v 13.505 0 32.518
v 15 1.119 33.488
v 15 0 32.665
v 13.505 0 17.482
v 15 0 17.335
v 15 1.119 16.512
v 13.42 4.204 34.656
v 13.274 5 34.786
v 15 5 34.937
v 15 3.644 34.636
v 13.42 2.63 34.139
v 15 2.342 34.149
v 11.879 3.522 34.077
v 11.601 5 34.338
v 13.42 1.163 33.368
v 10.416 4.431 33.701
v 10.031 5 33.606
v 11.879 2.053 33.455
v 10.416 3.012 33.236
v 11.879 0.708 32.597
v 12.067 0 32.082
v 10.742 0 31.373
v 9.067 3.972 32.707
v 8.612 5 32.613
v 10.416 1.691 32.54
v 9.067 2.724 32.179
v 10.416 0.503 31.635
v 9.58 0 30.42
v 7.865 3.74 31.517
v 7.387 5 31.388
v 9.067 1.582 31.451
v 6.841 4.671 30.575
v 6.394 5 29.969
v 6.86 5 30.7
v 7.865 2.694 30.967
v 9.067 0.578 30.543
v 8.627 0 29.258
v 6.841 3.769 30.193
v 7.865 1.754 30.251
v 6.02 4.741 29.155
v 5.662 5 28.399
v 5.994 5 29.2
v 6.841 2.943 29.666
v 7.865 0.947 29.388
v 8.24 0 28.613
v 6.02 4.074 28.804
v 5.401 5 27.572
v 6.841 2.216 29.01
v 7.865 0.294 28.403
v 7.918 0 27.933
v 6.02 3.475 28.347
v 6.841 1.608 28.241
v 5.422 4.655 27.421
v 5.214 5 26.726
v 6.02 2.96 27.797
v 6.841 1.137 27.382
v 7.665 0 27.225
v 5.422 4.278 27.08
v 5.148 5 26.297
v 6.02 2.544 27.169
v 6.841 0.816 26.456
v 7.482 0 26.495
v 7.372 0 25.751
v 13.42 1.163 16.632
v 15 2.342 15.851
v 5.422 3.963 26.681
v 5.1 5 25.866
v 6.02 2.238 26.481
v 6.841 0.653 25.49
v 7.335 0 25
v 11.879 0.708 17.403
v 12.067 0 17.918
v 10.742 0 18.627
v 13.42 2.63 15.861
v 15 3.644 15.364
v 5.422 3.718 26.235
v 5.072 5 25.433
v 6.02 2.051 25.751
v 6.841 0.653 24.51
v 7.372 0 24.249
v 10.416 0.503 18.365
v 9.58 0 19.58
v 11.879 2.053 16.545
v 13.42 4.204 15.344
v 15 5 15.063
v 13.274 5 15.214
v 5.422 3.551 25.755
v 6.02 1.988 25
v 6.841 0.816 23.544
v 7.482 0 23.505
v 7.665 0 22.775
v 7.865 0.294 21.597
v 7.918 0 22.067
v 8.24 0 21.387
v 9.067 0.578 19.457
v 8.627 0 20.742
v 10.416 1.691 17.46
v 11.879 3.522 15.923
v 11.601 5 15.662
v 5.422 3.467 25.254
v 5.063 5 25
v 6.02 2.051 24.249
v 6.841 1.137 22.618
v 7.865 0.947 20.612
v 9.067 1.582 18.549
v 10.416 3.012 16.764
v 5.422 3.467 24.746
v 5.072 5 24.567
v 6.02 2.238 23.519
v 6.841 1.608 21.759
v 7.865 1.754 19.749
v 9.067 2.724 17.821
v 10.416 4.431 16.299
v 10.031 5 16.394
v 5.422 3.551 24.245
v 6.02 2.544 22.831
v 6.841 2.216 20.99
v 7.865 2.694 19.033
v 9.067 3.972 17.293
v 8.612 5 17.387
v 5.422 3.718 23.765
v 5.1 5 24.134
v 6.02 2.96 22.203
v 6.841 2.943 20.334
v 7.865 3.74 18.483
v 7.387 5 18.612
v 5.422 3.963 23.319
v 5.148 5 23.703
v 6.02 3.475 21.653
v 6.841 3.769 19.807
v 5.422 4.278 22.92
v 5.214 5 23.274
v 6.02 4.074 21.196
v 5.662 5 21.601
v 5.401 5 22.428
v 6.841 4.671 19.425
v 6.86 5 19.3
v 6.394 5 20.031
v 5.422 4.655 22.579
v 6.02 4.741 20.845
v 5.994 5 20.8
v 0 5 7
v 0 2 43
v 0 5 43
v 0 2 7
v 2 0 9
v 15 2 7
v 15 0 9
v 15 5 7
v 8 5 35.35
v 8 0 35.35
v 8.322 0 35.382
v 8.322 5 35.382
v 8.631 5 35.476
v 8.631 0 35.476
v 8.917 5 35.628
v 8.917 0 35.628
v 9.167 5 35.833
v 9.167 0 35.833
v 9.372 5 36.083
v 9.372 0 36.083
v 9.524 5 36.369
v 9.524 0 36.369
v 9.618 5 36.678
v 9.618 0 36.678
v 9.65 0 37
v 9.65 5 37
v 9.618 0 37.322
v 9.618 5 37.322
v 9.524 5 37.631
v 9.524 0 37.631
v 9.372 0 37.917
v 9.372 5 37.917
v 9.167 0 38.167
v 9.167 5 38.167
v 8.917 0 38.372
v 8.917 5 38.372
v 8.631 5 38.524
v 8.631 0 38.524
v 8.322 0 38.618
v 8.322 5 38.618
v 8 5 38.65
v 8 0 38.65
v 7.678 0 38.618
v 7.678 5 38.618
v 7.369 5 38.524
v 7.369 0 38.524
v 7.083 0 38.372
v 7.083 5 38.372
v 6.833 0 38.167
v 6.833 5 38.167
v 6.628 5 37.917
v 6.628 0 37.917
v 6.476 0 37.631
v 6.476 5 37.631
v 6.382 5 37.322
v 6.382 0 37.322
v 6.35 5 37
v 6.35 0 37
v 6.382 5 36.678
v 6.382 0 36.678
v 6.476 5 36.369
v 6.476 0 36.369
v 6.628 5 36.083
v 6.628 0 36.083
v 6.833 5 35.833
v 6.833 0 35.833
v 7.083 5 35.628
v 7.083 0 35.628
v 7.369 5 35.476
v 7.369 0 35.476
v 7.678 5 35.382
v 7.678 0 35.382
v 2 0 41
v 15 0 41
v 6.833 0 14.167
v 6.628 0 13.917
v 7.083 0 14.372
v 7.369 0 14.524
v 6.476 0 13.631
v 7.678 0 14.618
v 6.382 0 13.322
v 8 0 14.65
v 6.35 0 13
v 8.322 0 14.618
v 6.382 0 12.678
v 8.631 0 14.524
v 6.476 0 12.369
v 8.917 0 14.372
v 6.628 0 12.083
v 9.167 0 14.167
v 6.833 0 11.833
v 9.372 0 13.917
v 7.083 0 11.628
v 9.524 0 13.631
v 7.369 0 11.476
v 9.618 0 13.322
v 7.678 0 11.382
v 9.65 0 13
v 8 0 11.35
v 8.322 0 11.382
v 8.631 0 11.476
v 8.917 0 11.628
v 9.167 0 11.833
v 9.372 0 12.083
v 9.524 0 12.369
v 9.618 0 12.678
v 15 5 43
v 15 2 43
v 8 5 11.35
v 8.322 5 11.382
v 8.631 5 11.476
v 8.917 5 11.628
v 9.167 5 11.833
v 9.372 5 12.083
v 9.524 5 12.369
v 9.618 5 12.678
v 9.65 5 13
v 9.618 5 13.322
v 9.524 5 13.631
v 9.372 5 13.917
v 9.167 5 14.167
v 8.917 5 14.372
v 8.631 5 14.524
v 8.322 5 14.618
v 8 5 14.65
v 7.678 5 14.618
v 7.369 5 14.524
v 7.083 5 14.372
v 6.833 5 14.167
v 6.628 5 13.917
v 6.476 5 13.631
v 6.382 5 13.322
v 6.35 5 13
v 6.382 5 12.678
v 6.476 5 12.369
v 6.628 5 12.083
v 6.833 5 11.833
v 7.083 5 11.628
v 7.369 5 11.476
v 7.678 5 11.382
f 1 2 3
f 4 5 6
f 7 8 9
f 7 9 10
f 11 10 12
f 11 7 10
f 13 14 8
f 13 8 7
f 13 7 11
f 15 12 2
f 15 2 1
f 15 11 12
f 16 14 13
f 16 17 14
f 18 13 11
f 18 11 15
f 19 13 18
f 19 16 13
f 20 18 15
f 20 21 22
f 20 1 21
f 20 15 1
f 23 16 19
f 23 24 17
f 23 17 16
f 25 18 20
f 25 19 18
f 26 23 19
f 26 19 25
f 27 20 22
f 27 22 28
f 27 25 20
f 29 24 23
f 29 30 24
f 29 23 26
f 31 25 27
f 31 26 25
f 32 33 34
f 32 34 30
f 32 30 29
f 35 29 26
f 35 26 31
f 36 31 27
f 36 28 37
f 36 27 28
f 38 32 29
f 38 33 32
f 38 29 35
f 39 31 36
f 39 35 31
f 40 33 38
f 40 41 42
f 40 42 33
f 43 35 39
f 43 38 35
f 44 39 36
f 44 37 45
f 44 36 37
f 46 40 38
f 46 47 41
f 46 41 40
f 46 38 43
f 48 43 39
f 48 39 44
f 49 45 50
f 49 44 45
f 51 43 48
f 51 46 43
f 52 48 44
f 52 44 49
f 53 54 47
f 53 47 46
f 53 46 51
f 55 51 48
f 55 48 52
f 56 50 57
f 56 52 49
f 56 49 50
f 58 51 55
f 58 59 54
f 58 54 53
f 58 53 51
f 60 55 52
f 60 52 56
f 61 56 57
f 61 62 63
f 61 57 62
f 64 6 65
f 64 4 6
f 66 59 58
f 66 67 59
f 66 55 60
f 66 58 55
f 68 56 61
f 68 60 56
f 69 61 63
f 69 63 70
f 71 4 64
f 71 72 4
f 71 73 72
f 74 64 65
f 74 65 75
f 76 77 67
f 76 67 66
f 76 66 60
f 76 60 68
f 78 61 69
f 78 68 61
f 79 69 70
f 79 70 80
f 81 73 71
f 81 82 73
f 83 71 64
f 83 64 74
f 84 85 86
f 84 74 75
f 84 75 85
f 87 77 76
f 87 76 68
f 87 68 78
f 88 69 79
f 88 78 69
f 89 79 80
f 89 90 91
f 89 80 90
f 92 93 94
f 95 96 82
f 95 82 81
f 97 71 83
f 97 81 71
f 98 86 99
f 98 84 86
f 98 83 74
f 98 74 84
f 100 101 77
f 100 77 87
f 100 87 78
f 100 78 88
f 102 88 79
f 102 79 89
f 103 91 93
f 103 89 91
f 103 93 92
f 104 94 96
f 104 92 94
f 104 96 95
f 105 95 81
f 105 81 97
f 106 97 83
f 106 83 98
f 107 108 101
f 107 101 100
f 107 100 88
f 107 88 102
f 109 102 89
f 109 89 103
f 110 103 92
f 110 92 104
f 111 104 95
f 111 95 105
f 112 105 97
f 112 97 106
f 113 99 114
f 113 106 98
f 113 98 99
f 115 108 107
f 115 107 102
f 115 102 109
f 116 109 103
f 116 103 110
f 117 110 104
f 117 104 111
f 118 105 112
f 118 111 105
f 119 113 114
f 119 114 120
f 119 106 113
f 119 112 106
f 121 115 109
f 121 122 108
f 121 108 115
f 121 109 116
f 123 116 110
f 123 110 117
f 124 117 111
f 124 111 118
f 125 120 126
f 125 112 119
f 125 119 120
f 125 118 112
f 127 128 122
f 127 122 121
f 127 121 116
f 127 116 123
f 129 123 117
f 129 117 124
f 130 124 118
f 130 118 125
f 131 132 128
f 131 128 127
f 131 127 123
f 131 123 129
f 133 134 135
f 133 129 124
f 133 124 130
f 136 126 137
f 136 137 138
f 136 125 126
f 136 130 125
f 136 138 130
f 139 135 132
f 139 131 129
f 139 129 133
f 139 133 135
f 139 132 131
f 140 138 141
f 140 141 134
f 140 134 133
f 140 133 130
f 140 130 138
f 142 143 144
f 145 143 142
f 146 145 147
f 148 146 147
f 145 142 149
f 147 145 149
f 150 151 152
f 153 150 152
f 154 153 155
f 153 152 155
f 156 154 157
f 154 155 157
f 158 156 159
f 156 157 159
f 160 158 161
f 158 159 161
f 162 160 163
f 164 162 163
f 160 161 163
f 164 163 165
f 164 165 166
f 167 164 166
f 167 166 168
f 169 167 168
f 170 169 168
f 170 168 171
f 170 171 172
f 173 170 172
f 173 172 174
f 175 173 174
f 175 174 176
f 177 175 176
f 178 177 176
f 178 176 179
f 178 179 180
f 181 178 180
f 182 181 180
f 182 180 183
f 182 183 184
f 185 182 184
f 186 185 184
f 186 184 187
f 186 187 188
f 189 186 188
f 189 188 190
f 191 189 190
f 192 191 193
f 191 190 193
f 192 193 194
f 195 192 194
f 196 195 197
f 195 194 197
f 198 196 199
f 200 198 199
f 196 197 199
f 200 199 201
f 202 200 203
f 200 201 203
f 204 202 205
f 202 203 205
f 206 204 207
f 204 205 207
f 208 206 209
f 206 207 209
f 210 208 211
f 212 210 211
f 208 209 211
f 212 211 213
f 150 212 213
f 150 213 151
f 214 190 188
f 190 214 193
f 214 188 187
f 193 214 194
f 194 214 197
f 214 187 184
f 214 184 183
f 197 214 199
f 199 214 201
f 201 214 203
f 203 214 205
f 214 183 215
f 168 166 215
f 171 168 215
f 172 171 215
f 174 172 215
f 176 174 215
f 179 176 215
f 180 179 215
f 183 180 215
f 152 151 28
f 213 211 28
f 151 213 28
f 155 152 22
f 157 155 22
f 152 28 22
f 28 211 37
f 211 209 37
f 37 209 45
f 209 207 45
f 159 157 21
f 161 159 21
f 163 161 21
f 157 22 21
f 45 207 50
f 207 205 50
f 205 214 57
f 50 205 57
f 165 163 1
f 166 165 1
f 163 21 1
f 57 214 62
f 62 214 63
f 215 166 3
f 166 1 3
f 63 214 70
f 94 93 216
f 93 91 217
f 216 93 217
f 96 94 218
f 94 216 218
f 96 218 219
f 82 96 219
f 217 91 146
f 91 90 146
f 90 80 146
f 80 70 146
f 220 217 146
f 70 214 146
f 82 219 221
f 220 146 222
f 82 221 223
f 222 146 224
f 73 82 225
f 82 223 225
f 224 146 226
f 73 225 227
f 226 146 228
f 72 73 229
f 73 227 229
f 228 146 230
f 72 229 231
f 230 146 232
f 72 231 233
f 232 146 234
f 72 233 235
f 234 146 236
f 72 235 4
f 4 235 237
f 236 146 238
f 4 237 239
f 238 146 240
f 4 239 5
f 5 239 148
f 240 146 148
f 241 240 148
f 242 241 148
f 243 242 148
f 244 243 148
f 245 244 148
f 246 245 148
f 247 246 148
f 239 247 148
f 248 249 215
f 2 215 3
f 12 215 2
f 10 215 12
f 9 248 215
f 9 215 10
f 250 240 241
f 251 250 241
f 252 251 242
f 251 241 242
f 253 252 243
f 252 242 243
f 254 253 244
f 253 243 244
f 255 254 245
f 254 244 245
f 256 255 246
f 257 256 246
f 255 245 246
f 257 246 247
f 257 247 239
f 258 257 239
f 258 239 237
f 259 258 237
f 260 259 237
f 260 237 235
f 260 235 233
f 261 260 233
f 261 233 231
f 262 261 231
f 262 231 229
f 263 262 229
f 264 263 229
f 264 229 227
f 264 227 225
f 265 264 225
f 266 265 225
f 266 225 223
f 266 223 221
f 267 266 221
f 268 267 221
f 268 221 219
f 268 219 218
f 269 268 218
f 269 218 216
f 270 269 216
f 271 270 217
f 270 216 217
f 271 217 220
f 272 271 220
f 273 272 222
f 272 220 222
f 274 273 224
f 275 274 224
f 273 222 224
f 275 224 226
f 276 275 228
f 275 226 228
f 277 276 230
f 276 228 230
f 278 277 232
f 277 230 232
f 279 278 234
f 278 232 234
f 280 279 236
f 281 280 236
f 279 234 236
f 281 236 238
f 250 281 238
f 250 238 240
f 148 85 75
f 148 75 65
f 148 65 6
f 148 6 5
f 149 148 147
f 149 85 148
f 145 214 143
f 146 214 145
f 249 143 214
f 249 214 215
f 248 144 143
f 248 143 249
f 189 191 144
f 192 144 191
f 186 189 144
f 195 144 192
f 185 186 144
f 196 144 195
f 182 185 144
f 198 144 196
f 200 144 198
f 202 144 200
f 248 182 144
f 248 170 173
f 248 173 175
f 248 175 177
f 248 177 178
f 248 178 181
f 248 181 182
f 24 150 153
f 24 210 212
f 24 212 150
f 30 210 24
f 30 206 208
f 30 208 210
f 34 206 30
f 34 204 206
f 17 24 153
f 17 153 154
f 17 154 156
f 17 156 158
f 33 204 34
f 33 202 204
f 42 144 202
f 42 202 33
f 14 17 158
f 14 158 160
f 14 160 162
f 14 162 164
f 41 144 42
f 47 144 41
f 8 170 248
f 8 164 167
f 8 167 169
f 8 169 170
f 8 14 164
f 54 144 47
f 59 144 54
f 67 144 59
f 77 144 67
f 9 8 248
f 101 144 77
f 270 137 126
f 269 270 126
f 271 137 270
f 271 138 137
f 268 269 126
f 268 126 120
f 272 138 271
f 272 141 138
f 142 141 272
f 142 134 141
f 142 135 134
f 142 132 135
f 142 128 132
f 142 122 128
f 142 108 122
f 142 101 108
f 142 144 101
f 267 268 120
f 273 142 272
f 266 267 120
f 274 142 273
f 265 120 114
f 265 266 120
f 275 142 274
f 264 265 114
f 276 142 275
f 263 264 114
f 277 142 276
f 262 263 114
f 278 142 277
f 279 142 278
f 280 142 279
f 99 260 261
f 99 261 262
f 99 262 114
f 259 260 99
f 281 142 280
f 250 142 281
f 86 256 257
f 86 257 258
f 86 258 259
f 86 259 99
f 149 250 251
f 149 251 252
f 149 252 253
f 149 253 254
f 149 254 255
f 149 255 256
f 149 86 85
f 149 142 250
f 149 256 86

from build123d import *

# Parameters (mm, degrees)
SKETCH_1_W          = 30
SKETCH_1_H          = 50
EXTRUDE_1_DEPTH     = 5
SKETCH_3_R          = 1.65
CUT_EXTRUDE_1_DEPTH = 59.523499554
SKETCH_4_W          = 41.234400122
SKETCH_4_H          = 9.68197476
SKETCH_4_W_2        = 47.672667602
SKETCH_4_H_2        = 11.058093
CUT_EXTRUDE_2_DEPTH = 59.523499554
SKETCH_5_W          = 20.505917257
SKETCH_5_H          = 40.348212596
CUT_EXTRUDE_3_DEPTH = 53.668776329
CHAMFER_1_SIZE      = 2


with BuildPart() as part:
    # 草图1 → 凸台-拉伸1 (new body)
    with BuildSketch(Plane(origin=(0, 0, 0), x_dir=(1, 0, 0), z_dir=(0, 1, 0))):
        with Locations((15, -25)):
            Rectangle(SKETCH_1_W, SKETCH_1_H)
    extrude(amount=EXTRUDE_1_DEPTH)

    # 草图2 → 切除-旋转1 (revolve, cut)
    with BuildSketch(Plane(origin=(0, 6.5, 0), x_dir=(1, 0, 0), z_dir=(0, 1, 0))):
        with BuildLine():
            Line((4.95, -25), (25.05, -25))
            ThreePointArc((25.05, -25), (15, -35.05), (4.95, -25))
        make_face()
    revolve(axis=Axis((4.95, 6.5, 25), (1, 0, 0)), mode=Mode.SUBTRACT)

    # 草图3 → 切除-拉伸1 (cut, through all)
    with BuildSketch(Plane(origin=(0, 0, 0), x_dir=(-1, 0, 0), z_dir=(0, -1, 0))):
        with Locations(Location((-8, -37, 0), (0, 0, 90))):
            Circle(SKETCH_3_R)
        with Locations(Location((-22, -37, 0), (0, 0, 90))):
            Circle(SKETCH_3_R)
        with Locations(Location((-8, -13, 0), (0, 0, 90))):
            Circle(SKETCH_3_R)
        with Locations(Location((-22, -13, 0), (0, 0, 90))):
            Circle(SKETCH_3_R)
    extrude(amount=-CUT_EXTRUDE_1_DEPTH, mode=Mode.SUBTRACT)

    # 草图4 → 切除-拉伸2 (cut, through all)
    with BuildSketch(Plane(origin=(0, 5, 0), x_dir=(1, 0, 0), z_dir=(0, 1, 0))):
        with Locations((14.53310274, -2.15901262)):
            Rectangle(SKETCH_4_W, SKETCH_4_H)
        with Locations((15.58976496, -48.5290465)):
            Rectangle(SKETCH_4_W_2, SKETCH_4_H_2)
    extrude(amount=-CUT_EXTRUDE_2_DEPTH, mode=Mode.SUBTRACT)

    # 草图5 → 切除-拉伸3 (cut, through all)
    with BuildSketch(Plane(origin=(0, 5, 0), x_dir=(1, 0, 0), z_dir=(0, 1, 0))):
        with Locations((25.252958629, -25.047535921)):
            Rectangle(SKETCH_5_W, SKETCH_5_H)
    extrude(amount=-CUT_EXTRUDE_3_DEPTH, mode=Mode.SUBTRACT)

    # 倒角1
    chamfer_1_edges = [part.edges().sort_by_distance(p)[0] for p in [
        (0, 0, 25),
        (7.5, 0, 7),
        (7.5, 0, 43),
    ]]
    chamfer(chamfer_1_edges, length=CHAMFER_1_SIZE)


solid = part.part
